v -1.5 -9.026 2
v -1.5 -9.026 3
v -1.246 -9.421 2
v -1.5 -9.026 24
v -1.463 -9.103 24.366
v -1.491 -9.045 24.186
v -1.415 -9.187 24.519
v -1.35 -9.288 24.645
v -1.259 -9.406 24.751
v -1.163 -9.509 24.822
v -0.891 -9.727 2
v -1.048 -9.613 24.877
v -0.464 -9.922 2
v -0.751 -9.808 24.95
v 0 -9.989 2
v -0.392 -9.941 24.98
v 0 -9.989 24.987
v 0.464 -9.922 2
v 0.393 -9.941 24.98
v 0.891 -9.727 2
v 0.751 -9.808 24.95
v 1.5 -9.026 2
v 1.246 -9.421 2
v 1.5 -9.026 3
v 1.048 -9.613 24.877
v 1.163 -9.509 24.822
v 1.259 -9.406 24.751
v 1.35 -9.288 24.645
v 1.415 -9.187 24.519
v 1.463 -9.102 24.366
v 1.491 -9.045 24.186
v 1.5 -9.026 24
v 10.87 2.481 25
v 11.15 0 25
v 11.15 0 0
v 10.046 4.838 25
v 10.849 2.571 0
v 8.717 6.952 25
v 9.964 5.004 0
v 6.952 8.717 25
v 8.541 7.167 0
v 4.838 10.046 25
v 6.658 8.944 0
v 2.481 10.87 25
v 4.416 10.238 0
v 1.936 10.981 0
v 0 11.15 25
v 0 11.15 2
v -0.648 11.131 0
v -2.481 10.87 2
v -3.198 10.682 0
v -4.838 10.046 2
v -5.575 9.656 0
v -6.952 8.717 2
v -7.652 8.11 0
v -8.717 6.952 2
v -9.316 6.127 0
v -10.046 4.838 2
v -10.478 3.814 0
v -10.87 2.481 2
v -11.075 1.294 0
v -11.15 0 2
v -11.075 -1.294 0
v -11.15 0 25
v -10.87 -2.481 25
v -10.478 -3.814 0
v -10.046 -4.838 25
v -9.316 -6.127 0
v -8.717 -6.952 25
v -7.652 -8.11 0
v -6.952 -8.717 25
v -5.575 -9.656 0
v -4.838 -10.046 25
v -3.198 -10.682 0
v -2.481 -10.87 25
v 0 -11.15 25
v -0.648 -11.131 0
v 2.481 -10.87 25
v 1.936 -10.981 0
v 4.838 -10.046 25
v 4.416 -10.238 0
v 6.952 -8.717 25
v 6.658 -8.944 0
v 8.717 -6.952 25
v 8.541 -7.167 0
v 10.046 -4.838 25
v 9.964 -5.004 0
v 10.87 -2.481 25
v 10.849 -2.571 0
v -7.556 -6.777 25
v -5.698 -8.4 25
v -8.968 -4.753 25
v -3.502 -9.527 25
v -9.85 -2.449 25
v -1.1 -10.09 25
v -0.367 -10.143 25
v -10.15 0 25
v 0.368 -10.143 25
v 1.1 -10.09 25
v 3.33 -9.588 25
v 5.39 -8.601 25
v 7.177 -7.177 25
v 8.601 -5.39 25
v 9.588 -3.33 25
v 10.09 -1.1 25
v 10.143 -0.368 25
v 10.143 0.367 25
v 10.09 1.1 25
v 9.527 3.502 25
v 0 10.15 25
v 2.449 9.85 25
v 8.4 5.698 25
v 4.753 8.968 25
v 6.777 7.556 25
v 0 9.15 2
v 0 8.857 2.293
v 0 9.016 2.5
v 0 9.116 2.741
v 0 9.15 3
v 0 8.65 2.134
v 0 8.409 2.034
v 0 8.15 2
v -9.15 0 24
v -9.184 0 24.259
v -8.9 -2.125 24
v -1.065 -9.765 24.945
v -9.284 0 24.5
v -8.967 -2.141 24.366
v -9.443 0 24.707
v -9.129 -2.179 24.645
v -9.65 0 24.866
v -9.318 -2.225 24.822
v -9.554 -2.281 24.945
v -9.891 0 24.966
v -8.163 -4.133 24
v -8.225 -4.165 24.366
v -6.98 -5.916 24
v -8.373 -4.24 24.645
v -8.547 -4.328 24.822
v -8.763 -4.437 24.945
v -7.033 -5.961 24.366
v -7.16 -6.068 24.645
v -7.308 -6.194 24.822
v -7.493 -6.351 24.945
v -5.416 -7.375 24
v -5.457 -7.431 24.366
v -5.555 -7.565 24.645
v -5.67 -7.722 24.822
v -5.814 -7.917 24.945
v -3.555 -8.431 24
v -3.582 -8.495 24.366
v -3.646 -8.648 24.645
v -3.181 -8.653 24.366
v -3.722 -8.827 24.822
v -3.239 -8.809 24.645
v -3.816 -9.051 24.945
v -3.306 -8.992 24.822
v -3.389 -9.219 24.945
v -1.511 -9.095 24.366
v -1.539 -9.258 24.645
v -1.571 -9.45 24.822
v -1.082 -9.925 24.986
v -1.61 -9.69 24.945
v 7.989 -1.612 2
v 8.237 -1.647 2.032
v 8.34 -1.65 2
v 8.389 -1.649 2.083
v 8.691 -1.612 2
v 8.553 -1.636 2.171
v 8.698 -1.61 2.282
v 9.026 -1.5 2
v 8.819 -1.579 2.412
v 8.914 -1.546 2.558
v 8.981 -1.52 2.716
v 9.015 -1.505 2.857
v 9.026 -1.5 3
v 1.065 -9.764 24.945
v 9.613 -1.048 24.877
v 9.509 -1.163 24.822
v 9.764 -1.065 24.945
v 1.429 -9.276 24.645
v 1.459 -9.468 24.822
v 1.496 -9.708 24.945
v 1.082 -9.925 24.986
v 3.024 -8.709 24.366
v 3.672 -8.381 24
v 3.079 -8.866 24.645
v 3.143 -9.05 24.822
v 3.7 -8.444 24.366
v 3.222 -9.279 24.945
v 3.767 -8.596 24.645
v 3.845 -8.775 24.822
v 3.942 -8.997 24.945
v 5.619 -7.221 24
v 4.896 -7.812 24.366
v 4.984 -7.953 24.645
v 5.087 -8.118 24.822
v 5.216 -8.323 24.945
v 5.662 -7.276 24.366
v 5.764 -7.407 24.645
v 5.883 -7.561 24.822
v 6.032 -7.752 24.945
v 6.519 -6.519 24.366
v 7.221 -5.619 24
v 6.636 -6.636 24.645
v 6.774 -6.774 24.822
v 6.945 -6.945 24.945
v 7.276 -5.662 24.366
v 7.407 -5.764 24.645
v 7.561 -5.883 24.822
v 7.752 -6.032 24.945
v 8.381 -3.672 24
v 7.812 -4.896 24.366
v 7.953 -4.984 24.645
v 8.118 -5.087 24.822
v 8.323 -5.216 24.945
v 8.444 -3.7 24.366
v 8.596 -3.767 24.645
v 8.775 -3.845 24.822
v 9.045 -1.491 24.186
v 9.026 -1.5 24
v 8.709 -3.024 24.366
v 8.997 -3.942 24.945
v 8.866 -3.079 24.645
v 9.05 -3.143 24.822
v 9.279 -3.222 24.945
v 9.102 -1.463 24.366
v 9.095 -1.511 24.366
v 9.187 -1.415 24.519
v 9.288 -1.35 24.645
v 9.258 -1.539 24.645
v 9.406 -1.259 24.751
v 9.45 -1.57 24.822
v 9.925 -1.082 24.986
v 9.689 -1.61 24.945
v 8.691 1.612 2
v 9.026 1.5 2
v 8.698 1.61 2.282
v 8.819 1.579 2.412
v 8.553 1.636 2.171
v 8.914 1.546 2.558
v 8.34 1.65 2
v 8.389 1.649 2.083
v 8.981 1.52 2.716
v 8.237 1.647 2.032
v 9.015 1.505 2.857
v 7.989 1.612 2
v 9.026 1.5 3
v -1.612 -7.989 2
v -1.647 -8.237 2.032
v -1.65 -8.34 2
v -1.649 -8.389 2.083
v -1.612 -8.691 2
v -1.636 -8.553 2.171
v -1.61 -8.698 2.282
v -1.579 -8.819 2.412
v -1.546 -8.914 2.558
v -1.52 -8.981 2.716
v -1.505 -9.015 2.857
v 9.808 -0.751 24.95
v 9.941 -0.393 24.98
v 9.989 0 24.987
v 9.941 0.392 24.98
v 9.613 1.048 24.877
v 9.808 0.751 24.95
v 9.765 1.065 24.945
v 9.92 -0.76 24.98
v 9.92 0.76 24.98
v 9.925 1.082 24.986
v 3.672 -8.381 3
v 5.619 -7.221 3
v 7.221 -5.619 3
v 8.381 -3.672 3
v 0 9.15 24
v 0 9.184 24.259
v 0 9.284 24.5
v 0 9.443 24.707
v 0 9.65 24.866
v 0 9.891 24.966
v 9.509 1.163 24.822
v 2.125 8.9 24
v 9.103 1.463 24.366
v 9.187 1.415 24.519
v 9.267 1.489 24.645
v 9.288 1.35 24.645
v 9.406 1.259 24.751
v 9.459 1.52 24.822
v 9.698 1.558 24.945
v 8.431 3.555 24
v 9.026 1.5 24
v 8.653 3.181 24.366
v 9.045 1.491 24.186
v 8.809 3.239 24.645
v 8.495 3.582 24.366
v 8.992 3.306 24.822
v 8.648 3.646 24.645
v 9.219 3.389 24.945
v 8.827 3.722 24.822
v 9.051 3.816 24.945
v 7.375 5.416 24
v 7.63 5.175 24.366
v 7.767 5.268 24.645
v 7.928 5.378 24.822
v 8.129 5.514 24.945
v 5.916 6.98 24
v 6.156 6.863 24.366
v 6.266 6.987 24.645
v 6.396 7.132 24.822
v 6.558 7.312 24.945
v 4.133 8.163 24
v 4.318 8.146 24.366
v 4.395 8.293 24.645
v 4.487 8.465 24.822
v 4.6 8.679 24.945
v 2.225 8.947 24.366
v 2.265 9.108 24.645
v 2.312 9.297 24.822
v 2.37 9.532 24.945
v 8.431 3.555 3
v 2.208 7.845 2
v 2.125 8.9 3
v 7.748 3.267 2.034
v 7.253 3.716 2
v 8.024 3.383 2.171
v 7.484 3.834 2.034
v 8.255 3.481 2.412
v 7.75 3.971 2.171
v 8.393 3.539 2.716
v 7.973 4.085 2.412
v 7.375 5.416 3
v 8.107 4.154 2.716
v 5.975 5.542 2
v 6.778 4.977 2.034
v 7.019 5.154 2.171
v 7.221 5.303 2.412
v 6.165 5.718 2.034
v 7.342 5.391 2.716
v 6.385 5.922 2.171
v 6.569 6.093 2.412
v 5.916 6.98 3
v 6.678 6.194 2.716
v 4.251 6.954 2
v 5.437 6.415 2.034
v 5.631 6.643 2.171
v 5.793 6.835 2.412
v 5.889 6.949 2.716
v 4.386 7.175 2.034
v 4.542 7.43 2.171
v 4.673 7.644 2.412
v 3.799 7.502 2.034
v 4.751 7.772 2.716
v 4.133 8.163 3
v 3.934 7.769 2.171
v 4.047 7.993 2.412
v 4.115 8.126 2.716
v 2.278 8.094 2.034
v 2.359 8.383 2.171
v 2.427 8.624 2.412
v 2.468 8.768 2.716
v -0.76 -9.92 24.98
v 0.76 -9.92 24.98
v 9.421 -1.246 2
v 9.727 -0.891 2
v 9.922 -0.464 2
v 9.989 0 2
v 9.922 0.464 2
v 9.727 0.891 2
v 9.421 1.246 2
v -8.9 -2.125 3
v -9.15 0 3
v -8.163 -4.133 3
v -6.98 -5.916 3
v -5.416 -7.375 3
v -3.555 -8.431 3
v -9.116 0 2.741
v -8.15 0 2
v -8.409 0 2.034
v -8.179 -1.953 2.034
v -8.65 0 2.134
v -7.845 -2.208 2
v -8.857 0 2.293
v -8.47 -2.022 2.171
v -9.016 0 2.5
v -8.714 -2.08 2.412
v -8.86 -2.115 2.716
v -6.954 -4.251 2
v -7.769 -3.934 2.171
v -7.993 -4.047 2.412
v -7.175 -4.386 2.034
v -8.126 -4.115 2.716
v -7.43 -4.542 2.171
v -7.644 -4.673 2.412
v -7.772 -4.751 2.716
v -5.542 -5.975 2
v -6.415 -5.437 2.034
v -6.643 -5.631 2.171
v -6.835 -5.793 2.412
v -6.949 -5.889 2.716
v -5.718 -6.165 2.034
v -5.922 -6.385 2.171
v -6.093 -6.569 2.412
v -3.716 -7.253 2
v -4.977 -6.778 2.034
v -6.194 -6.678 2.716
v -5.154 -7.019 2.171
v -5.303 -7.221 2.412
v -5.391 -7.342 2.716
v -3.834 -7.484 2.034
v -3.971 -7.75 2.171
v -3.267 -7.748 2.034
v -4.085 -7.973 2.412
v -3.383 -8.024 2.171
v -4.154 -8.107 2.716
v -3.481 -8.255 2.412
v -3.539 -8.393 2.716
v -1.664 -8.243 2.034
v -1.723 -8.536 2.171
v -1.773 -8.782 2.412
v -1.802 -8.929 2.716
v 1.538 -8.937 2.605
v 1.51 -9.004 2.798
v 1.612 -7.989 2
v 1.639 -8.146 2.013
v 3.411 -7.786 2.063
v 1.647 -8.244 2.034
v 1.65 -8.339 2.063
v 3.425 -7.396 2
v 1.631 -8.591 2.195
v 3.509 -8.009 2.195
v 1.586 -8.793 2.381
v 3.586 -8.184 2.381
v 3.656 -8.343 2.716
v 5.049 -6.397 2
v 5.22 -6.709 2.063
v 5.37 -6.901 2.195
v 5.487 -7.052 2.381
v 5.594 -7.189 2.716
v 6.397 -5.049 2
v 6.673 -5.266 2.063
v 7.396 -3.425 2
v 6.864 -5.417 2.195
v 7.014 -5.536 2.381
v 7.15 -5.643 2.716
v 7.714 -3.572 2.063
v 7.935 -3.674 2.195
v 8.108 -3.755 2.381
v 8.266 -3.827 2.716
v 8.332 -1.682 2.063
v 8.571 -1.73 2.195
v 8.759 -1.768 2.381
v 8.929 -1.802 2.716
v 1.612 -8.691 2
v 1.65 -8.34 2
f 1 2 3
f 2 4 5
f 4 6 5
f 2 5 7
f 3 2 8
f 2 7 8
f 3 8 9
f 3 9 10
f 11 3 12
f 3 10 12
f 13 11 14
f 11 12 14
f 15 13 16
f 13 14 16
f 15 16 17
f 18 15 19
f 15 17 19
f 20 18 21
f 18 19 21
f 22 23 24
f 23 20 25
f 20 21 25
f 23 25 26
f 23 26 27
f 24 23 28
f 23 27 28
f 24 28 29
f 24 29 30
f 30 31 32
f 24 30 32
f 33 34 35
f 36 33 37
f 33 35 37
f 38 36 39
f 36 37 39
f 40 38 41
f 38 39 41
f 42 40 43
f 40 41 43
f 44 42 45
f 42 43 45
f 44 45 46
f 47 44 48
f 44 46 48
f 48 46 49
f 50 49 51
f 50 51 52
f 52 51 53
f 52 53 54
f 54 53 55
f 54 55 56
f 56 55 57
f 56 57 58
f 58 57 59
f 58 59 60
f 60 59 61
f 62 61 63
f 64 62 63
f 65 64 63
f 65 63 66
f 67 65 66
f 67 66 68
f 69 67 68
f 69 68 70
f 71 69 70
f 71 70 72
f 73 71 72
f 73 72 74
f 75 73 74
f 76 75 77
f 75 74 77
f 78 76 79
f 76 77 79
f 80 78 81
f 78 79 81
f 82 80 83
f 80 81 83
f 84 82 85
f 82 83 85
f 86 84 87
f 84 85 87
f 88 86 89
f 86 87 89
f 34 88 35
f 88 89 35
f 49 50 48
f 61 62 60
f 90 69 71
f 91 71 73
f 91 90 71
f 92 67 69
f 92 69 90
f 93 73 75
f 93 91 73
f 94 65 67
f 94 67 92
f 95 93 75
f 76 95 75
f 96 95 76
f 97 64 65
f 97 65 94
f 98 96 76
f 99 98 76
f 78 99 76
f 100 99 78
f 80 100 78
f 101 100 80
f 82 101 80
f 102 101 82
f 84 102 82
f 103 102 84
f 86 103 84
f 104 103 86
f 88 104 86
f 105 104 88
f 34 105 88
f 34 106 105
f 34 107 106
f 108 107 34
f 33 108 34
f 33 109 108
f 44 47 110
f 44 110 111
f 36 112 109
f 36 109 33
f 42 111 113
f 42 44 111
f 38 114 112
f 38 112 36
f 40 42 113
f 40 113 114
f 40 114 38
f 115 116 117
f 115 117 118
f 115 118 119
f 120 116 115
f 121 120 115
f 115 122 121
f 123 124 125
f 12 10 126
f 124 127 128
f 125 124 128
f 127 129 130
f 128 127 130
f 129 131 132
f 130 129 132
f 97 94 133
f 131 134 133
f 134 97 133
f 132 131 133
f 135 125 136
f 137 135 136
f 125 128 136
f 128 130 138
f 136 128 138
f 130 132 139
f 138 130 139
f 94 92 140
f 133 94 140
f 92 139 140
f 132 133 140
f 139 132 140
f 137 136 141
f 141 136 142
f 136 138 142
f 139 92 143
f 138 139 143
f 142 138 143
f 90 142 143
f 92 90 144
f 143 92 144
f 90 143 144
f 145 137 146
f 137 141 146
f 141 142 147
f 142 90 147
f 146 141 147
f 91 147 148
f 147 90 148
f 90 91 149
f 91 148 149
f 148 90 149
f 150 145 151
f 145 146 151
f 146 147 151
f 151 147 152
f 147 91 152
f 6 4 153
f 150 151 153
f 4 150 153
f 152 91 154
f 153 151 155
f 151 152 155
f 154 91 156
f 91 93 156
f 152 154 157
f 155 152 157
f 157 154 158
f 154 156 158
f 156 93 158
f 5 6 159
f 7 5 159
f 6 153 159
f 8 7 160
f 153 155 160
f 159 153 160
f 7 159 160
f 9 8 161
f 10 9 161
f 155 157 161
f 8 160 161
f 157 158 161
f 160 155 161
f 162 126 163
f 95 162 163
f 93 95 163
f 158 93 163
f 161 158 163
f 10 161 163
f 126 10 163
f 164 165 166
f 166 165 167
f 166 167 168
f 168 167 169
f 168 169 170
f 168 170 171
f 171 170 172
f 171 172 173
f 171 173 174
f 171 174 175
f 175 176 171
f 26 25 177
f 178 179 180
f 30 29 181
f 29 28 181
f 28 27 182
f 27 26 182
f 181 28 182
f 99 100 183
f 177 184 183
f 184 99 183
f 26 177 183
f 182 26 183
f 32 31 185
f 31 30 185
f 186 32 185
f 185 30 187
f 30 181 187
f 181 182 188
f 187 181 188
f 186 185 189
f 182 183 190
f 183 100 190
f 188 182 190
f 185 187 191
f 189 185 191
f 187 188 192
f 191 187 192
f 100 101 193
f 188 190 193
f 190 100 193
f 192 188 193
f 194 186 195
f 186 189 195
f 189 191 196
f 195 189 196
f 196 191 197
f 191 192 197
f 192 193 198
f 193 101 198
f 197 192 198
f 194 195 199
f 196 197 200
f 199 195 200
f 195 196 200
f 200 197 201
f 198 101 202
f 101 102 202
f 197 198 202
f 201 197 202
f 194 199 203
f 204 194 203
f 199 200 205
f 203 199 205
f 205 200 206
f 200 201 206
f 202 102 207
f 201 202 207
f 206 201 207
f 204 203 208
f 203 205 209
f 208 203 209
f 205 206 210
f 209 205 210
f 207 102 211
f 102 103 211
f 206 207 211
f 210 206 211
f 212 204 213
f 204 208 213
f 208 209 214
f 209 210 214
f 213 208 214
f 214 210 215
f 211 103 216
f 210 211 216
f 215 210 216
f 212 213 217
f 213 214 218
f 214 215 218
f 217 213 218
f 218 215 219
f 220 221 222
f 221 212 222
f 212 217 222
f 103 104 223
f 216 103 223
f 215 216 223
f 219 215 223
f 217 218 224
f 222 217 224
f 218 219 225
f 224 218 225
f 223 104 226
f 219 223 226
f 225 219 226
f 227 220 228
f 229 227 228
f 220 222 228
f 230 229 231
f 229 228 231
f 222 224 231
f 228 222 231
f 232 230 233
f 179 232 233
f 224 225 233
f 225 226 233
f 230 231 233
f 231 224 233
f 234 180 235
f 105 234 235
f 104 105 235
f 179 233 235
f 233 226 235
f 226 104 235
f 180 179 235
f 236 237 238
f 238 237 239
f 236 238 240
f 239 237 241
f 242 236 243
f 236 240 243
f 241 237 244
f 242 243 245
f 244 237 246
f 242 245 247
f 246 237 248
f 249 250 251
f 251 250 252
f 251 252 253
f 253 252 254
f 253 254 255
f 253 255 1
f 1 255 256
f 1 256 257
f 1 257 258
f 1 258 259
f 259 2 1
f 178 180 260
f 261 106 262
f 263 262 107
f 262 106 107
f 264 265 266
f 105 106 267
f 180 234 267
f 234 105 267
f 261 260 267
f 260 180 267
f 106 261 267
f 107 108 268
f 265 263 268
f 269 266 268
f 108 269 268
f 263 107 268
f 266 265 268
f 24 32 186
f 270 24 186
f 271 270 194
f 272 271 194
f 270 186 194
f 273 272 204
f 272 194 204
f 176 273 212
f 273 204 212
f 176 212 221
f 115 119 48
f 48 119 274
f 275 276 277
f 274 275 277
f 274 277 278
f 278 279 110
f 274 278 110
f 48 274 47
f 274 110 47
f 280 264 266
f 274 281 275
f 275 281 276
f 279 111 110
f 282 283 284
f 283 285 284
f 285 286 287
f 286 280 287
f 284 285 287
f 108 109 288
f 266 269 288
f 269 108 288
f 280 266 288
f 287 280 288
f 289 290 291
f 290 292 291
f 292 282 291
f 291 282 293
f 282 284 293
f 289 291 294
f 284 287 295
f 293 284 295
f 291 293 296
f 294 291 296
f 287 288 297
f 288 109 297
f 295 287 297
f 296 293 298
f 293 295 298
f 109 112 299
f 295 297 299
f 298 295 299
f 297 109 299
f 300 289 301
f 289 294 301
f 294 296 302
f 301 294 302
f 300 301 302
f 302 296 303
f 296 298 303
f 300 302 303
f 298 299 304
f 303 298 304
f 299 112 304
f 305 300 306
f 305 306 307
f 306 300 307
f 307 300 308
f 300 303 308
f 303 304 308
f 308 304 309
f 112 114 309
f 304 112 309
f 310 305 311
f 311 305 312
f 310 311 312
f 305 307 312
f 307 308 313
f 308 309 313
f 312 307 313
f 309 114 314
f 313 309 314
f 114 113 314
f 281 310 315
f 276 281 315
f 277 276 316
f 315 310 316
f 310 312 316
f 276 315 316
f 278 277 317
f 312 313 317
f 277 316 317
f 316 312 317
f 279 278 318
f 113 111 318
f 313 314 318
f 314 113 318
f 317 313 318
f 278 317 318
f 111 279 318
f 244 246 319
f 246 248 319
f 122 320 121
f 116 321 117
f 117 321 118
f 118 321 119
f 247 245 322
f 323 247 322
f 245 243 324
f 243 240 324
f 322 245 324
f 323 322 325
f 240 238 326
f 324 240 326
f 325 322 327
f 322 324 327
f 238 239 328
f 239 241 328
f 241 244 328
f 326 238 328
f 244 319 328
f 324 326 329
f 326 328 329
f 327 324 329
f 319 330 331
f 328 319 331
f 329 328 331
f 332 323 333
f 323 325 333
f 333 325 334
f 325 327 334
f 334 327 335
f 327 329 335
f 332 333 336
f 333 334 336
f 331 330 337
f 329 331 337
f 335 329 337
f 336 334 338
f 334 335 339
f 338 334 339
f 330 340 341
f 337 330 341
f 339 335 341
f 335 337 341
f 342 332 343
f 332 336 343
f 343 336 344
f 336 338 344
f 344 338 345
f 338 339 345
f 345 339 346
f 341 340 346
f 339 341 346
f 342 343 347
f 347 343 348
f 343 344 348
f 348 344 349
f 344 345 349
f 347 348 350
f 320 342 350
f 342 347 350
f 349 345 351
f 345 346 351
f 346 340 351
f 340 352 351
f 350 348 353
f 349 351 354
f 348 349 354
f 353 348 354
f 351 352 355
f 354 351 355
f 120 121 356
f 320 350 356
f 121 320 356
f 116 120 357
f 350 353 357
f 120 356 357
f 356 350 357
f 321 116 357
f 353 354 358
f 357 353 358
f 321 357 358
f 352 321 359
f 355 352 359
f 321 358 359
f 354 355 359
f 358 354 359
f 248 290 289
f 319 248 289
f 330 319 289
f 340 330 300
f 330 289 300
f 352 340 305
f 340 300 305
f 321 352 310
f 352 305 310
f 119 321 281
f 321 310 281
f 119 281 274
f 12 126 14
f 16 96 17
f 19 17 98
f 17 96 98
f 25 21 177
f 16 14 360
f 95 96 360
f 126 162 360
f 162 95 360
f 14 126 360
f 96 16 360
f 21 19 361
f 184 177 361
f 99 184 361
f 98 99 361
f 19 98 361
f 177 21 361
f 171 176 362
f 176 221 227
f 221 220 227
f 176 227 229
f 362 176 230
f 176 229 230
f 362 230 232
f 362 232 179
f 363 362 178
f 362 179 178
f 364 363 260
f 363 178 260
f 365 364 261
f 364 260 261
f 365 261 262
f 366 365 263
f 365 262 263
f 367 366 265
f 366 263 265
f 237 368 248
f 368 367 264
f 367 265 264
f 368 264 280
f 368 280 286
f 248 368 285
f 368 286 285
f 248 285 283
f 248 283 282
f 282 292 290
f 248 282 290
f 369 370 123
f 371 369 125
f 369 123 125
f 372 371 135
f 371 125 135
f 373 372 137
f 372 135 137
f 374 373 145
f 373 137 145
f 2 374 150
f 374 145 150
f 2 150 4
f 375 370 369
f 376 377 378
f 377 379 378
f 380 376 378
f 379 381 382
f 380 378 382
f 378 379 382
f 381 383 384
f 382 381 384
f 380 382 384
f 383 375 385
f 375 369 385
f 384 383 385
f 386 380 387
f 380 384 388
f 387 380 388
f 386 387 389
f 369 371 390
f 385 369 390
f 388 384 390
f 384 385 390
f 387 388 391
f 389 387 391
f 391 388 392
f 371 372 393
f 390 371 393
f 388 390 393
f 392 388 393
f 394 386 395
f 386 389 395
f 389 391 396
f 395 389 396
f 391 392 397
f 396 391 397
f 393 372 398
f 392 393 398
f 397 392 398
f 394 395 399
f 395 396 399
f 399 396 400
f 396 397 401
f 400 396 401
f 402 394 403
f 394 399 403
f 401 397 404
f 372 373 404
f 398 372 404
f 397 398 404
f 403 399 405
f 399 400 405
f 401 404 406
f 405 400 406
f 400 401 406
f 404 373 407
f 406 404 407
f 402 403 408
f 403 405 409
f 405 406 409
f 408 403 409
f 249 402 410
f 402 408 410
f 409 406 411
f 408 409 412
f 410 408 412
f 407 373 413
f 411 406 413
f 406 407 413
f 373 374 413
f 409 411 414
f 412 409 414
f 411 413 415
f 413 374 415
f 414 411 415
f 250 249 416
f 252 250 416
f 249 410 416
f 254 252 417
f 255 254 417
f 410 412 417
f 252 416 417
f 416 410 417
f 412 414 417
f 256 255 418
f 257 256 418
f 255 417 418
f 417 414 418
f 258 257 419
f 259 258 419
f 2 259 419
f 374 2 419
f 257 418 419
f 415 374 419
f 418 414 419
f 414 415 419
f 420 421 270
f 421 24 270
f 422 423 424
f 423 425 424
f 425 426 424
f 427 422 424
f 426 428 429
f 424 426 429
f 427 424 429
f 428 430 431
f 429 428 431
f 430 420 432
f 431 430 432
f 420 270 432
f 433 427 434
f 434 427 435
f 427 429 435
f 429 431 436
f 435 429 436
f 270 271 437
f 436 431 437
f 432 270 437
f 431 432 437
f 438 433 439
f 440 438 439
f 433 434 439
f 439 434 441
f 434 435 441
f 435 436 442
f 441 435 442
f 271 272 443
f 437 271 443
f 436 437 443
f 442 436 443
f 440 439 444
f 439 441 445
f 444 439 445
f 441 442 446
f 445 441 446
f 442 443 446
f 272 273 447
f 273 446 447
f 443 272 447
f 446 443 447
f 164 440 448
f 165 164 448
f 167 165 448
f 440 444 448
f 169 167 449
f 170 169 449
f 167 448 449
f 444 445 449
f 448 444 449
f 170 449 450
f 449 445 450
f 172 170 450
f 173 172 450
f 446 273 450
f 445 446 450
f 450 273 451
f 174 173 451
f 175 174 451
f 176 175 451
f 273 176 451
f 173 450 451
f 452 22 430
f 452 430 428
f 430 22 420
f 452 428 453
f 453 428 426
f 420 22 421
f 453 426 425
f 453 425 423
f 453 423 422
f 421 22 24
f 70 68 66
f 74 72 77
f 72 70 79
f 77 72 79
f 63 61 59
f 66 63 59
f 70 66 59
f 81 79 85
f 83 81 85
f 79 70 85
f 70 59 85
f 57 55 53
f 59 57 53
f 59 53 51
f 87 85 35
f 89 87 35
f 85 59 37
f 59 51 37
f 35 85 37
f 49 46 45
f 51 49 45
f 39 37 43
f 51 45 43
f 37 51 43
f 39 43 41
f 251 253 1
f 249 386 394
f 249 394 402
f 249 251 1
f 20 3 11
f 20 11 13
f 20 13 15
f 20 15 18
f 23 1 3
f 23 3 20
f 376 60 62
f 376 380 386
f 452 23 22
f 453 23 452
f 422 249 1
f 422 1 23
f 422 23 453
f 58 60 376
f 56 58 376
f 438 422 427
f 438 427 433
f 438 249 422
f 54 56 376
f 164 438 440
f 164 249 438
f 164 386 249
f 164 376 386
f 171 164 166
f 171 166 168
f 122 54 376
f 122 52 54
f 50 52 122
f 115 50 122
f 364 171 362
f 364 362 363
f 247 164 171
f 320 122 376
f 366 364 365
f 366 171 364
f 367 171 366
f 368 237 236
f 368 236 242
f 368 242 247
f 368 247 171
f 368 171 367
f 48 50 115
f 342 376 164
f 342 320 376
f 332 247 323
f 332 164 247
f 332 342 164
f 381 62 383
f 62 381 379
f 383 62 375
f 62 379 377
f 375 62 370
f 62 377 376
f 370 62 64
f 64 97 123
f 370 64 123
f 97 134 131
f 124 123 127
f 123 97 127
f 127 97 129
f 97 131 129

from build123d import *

# Parameters (mm, degrees)
F0_R         = 11.15
F1_DEPTH     = 25
F3_DEPTH     = 23
F4_T4_ANGLE  = 102.4463467312
F4_S5_R      = 1.65
F4_T6_DEPTH  = 9
F4_S7_R      = 1.65
F4_T8_DEPTH  = 9
F4_T12_ANGLE = 96.2242847007
F4_S13_R     = 1.65
F4_T14_DEPTH = 9
F4_T18_ANGLE = 96.2242847007
F4_S19_R     = 1.65
F4_T20_DEPTH = 9
F4_T22_ANGLE = 102.4463467312
F4_T24_ANGLE = 111.8839081247
F4_T26_ANGLE = 111.8839081247


# Not quite as in the source:
# - a fillet or chamfer that OpenCascade refuses, or shapes differently, is made with other operations: its cross-section is extruded or revolved along the edge and cut away or added


with BuildPart() as f1:
    # F0 (on Top) → F1 (new body)
    with BuildSketch(Plane.XY):
        Circle(F0_R)
    extrude(amount=F1_DEPTH)

    # F2 (on face) → F3 (cut)
    with BuildSketch(Plane.XY.offset(25)):
        with BuildLine():
            ThreePointArc((9.02621183, -1.5), (9.1190004453, -0.7525495849), (9.15, 0))
            ThreePointArc((9.15, 0), (9.1190004453, 0.7525495849), (9.02621183, 1.5))
            ThreePointArc((9.02621183, 1.5), (5.9159741379, 6.9802399672), (0, 9.15))
            ThreePointArc((0, 9.15), (-6.4700270479, 6.4700270479), (-9.15, 0))
            ThreePointArc((-9.15, 0), (-6.9802399672, -5.9159741379), (-1.5, -9.02621183))
            ThreePointArc((-1.5, -9.02621183), (0, -9.15), (1.5, -9.02621183))
            ThreePointArc((1.5, -9.02621183), (6.4700270479, -6.4700270479), (9.02621183, -1.5))
        make_face()
        with BuildLine():
            ThreePointArc((9.02621183, 1.5), (9.1190004453, 0.7525495849), (9.15, 0))
            ThreePointArc((9.15, 0), (9.1190004453, -0.7525495849), (9.02621183, -1.5))
            ThreePointArc((9.02621183, -1.5), (9.9888254758, 0), (9.02621183, 1.5))
        make_face()
        with BuildLine():
            ThreePointArc((-1.5, -9.02621183), (0, -9.9888254758), (1.5, -9.02621183))
            ThreePointArc((1.5, -9.02621183), (0, -9.15), (-1.5, -9.02621183))
        make_face()
        with BuildLine():
            ThreePointArc((-9.15, 0), (-6.4700270479, 6.4700270479), (0, 9.15))
            Line((0, 9.15), (0, 11.15))
            ThreePointArc((0, 11.15), (-7.8842406102, 7.8842406102), (-11.15, 0))
            Line((-11.15, 0), (-9.15, 0))
        make_face()
    extrude(amount=-F3_DEPTH, mode=Mode.SUBTRACT)

    # F4: fillet of radius 1 on 6 edges, made by hand


with BuildPart() as f4_tool2:
    # F4_s3 → F4_t4 (revolve)
    with BuildSketch(Plane(origin=(0, 0, 0), x_dir=(0, 0, 1), z_dir=(-0.9941072022, 0.1084014327, 0))):
        with BuildLine():
            ThreePointArc((2, -8.15), (2.2928932188, -8.8571067812), (3, -9.15))
            Line((3, -9.15), (2, -9.15))
            Line((2, -9.15), (2, -8.15))
        make_face()
    revolve(axis=Axis((0, 0, 2), (0, 0, 1)), revolution_arc=F4_T4_ANGLE)

    # F4_s5 → F4_t6 (cut, symmetric)
    with BuildSketch(Plane.XY.offset(2.9)):
        with Locations((8.3388254758, 0)):
            Circle(F4_S5_R)
    extrude(amount=F4_T6_DEPTH, both=True, mode=Mode.SUBTRACT)

    # F4_s7 → F4_t8 (cut, symmetric)
    with BuildSketch(Plane.XY.offset(2.9)):
        with Locations((0, -8.3388254758)):
            Circle(F4_S7_R)
    extrude(amount=F4_T8_DEPTH, both=True, mode=Mode.SUBTRACT)


with BuildPart() as f1_1:
    add(f1.part)

    # F4_t1: union F4_tool2
    add(f4_tool2.part)


with BuildPart() as f4_tool10:
    # F4_s11 → F4_t12 (revolve)
    with BuildSketch(Plane(origin=(0, 0, 0), x_dir=(0, 0, 1), z_dir=(-0.1084207149, -0.9941050994, 0))):
        with BuildLine():
            ThreePointArc((2, -8.15), (2.2928932188, -8.8571067812), (3, -9.15))
            Line((3, -9.15), (2, -9.15))
            Line((2, -9.15), (2, -8.15))
        make_face()
    revolve(axis=Axis((0, 0, 2), (0, 0, 1)), revolution_arc=F4_T12_ANGLE)

    # F4_s13 → F4_t14 (cut, symmetric)
    with BuildSketch(Plane.XY.offset(2.9)):
        with Locations((8.3388254758, 0)):
            Circle(F4_S13_R)
    extrude(amount=F4_T14_DEPTH, both=True, mode=Mode.SUBTRACT)


with BuildPart() as f1_2:
    add(f1_1.part)

    # F4_t9: union F4_tool10
    add(f4_tool10.part)


with BuildPart() as f4_tool16:
    # F4_s17 → F4_t18 (revolve)
    with BuildSketch(Plane.XZ):
        with BuildLine():
            ThreePointArc((-8.15, 2), (-8.8571067812, 2.2928932188), (-9.15, 3))
            Line((-9.15, 3), (-9.15, 2))
            Line((-9.15, 2), (-8.15, 2))
        make_face()
    revolve(axis=Axis((0, 0, 2), (0, 0, 1)), revolution_arc=F4_T18_ANGLE)

    # F4_s19 → F4_t20 (cut, symmetric)
    with BuildSketch(Plane.XY.offset(2.9)):
        with Locations((0, -8.3388254758)):
            Circle(F4_S19_R)
    extrude(amount=F4_T20_DEPTH, both=True, mode=Mode.SUBTRACT)


with BuildPart() as f1_3:
    add(f1_2.part)

    # F4_t15: union F4_tool16
    add(f4_tool16.part)

    # F4_s21 → F4_t22 (revolve, cut)
    with BuildSketch(Plane(origin=(0, 0, 0), x_dir=(0, 0, 1), z_dir=(-0.9941072022, 0.1084014327, 0))):
        with BuildLine():
            ThreePointArc((24, -9.15), (24.7071067812, -9.4428932188), (25, -10.15))
            Line((25, -10.15), (25, -9.15))
            Line((25, -9.15), (24, -9.15))
        make_face()
    revolve(axis=Axis((0, 0, 25), (0, 0, 1)), revolution_arc=F4_T22_ANGLE, mode=Mode.SUBTRACT)

    # F4_s23 → F4_t24 (revolve, cut)
    with BuildSketch(Plane(origin=(0, 0, 0), x_dir=(0, 0, 1), z_dir=(0.2699219659, 0.9628822006, 0))):
        with BuildLine():
            ThreePointArc((24, -9.15), (24.7071067812, -9.4428932188), (25, -10.15))
            Line((25, -10.15), (25, -9.15))
            Line((25, -9.15), (24, -9.15))
        make_face()
    revolve(axis=Axis((0, 0, 25), (0, 0, 1)), revolution_arc=F4_T24_ANGLE, mode=Mode.SUBTRACT)

    # F4_s25 → F4_t26 (revolve, cut)
    with BuildSketch(Plane(origin=(0, 0, 0), x_dir=(0, 0, 1), z_dir=(-0.1084207149, -0.9941050994, 0))):
        with BuildLine():
            ThreePointArc((24, -9.15), (24.7071067812, -9.4428932188), (25, -10.15))
            Line((25, -10.15), (25, -9.15))
            Line((25, -9.15), (24, -9.15))
        make_face()
    revolve(axis=Axis((0, 0, 25), (0, 0, 1)), revolution_arc=F4_T26_ANGLE, mode=Mode.SUBTRACT)


solid = f1_3.part
